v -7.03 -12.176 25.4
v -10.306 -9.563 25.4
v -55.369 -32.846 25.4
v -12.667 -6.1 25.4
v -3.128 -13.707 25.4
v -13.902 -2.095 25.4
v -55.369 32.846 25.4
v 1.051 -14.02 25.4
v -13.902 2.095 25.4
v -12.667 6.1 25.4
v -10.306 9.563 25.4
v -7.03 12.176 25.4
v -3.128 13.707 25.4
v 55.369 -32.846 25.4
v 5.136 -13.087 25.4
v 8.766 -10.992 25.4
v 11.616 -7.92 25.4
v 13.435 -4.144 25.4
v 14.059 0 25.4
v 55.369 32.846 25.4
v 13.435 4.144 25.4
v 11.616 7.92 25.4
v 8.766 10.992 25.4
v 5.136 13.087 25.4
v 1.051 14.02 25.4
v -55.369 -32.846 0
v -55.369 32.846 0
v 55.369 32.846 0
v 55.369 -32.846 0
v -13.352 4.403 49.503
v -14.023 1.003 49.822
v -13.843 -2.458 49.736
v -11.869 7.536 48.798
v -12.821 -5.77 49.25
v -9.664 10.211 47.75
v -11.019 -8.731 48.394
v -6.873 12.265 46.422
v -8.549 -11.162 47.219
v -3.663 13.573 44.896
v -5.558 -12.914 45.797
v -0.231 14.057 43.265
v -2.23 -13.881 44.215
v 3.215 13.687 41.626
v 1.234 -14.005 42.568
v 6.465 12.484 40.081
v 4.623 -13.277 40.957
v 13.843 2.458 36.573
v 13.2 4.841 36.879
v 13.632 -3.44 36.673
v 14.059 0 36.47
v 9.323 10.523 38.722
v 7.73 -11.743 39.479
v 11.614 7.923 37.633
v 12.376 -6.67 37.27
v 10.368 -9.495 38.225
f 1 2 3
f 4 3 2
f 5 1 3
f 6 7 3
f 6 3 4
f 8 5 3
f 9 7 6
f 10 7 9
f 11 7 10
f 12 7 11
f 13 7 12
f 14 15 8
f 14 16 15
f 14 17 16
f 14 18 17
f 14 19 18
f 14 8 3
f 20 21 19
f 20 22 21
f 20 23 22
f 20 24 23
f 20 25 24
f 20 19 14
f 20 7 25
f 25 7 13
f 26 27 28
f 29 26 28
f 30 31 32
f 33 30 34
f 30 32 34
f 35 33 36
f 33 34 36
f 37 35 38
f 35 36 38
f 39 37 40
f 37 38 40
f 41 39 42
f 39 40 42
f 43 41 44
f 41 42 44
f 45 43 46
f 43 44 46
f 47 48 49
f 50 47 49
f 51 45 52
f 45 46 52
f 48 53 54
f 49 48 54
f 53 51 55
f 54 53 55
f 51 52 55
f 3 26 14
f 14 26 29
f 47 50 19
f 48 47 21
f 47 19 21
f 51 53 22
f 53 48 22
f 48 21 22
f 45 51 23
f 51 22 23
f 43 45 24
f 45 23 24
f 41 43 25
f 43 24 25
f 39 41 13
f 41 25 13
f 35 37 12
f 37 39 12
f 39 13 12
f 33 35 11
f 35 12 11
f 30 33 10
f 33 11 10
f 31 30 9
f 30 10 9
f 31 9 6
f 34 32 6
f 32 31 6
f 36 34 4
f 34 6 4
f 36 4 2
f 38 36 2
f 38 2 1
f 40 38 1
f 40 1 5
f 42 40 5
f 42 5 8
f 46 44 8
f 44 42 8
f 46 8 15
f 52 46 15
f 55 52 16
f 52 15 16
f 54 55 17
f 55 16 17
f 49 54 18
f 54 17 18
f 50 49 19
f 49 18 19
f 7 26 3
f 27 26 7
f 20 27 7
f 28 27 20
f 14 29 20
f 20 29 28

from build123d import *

# Parameters (mm, degrees)
F0_W     = 110.738724
F0_H     = 65.69177
F1_DEPTH = 25.4
F2_R     = 14.059136
F3_DEPTH = 50.8
F5_DEPTH = 50.8
F7_DEPTH = 25.4


with BuildPart() as f1:
    # F0 (on Top) → F1 (new body)
    with BuildSketch(Plane.XY):
        Rectangle(F0_W, F0_H)
    extrude(amount=F1_DEPTH)

    # F2 (on face) → F3 (join)
    with BuildSketch(Plane.XY.offset(25.4)):
        Circle(F2_R)
    extrude(amount=F3_DEPTH)

    # F4 (on Front) → F5 (cut, symmetric)
    with BuildSketch(Plane.XZ):
        Polygon((27.752033, 54.067187), (-22.952005, 54.067187), (27.752033, 29.959714), align=None)
    extrude(amount=F5_DEPTH, both=True, mode=Mode.SUBTRACT)

    # F6 (on Front) → F7 (cut, symmetric)
    with BuildSketch(Plane.XZ):
        Polygon((-32.981899, 81.521302), (-32.981899, 52.895501), (34.759905, 52.895501), (27.647903, 81.521302), align=None)
    extrude(amount=F7_DEPTH, both=True, mode=Mode.SUBTRACT)


solid = f1.part
